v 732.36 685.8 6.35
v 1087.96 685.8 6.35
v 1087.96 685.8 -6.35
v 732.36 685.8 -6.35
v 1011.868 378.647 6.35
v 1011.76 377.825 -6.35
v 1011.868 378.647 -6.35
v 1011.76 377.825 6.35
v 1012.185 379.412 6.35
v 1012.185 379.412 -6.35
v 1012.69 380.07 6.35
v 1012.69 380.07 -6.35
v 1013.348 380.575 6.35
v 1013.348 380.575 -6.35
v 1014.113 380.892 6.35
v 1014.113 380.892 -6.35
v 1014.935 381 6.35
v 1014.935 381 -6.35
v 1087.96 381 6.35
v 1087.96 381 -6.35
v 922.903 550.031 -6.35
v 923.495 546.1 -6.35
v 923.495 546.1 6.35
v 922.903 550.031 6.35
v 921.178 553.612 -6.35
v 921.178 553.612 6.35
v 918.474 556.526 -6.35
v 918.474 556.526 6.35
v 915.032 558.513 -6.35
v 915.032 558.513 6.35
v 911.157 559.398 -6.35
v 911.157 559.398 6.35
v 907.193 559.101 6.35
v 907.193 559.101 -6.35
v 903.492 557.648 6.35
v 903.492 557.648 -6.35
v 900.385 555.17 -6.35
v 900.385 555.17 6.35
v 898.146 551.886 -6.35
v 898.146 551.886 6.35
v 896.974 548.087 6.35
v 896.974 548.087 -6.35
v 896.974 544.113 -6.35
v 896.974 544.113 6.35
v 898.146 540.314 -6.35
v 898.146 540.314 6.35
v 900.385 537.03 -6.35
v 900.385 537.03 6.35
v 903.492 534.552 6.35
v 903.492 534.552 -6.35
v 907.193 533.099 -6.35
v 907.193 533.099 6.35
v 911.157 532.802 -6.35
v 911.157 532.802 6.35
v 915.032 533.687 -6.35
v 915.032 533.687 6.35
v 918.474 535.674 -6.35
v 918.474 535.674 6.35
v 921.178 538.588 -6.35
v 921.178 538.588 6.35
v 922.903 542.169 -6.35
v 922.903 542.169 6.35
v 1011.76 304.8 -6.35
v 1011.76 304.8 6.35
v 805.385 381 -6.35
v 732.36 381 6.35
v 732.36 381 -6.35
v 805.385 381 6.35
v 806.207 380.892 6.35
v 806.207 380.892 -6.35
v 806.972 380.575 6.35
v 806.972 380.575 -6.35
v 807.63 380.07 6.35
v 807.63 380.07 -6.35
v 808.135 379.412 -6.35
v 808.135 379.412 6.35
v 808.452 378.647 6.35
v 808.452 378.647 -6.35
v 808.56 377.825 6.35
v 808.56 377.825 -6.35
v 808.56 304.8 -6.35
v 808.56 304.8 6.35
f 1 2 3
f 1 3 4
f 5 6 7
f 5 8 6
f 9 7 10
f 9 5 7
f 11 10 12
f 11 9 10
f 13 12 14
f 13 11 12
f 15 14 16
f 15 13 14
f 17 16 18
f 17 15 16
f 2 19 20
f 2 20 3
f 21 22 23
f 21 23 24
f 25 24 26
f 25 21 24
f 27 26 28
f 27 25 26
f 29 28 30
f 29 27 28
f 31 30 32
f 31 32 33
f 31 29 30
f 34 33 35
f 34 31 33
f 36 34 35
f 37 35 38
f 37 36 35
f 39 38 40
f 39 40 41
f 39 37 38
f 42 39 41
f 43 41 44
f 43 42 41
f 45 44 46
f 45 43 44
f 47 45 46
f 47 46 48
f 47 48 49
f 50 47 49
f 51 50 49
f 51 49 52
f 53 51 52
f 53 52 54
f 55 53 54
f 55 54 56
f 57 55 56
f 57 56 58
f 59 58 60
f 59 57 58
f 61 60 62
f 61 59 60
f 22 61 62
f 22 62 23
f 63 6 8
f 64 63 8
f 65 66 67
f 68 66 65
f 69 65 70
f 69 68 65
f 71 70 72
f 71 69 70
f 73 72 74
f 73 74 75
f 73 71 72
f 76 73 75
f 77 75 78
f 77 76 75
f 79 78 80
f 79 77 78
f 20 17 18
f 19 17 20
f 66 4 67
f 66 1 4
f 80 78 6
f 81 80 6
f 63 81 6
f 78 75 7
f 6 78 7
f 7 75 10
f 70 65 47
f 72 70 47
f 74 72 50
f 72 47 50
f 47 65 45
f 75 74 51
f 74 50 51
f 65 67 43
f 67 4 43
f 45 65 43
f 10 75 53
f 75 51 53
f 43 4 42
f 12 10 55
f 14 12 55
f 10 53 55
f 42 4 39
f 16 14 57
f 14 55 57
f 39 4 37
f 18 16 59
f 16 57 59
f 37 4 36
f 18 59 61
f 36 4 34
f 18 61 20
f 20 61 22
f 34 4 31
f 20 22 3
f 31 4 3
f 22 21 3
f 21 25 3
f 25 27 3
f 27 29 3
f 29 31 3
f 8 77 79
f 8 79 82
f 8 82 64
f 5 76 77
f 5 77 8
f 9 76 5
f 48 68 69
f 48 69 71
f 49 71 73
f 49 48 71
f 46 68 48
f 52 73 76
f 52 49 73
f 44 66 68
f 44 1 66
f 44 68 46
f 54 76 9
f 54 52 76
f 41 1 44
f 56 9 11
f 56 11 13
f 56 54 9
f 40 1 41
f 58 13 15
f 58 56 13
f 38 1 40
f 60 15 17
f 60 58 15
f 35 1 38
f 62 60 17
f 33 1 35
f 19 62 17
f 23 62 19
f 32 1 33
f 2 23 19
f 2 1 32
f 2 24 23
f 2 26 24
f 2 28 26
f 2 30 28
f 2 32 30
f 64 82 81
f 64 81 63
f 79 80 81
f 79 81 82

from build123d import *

# Parameters (mm, degrees)
BOSS_EXTRUDE1_DEPTH = 6.35
SKETCH3_W           = 203.2
SKETCH3_H           = 12.7
BOSS_EXTRUDE2_DEPTH = 76.2
CAVITY1_START       = -6.35
CAVITY1_OUTLINE_R   = 12.7
CAVITY1_DEPTH       = 12.7
MOVE_FACE_HOLE_BY   = 0.635
SLOT_FILLET_R       = 3.175


# Read off the part's stored shape, not the designer's step: Cavity1
with BuildPart() as part:
    # Sketch1 → Boss-Extrude1 (new, symmetric)
    with BuildSketch(Plane.XY):
        Polygon((732.36, 381), (785.7, 381), (1001.6, 381), (1087.96, 381), (1087.96, 685.8), (1001.6, 685.8), (785.7, 685.8), (732.36, 685.8), align=None)
    extrude(amount=BOSS_EXTRUDE1_DEPTH, both=True)

    # Sketch3 → Boss-Extrude2 (add)
    with BuildSketch(Plane.XZ.offset(-381)):
        with Locations((910.16, 0)):
            Rectangle(SKETCH3_W, SKETCH3_H)
    extrude(amount=BOSS_EXTRUDE2_DEPTH)

    # Cavity1 outline → Cavity1 (cut)
    with BuildSketch(Plane.XY.offset(CAVITY1_START)):
        with Locations((910.16, 546.1)):
            Circle(CAVITY1_OUTLINE_R)
    extrude(amount=CAVITY1_DEPTH, mode=Mode.SUBTRACT)

    # Move Face Hole: a curved face moved inward by 0.635
    add(Solid.thicken(part.faces().sort_by_distance((897.46, 546.1, 0))[0], -MOVE_FACE_HOLE_BY), mode=Mode.SUBTRACT)

    # Slot Fillet
    slot_fillet_edges = [part.edges().sort_by_distance(p)[0] for p in [
        (808.56, 381, 0),
        (1011.76, 381, 0),
    ]]
    fillet(slot_fillet_edges, radius=SLOT_FILLET_R)


solid = part.part
